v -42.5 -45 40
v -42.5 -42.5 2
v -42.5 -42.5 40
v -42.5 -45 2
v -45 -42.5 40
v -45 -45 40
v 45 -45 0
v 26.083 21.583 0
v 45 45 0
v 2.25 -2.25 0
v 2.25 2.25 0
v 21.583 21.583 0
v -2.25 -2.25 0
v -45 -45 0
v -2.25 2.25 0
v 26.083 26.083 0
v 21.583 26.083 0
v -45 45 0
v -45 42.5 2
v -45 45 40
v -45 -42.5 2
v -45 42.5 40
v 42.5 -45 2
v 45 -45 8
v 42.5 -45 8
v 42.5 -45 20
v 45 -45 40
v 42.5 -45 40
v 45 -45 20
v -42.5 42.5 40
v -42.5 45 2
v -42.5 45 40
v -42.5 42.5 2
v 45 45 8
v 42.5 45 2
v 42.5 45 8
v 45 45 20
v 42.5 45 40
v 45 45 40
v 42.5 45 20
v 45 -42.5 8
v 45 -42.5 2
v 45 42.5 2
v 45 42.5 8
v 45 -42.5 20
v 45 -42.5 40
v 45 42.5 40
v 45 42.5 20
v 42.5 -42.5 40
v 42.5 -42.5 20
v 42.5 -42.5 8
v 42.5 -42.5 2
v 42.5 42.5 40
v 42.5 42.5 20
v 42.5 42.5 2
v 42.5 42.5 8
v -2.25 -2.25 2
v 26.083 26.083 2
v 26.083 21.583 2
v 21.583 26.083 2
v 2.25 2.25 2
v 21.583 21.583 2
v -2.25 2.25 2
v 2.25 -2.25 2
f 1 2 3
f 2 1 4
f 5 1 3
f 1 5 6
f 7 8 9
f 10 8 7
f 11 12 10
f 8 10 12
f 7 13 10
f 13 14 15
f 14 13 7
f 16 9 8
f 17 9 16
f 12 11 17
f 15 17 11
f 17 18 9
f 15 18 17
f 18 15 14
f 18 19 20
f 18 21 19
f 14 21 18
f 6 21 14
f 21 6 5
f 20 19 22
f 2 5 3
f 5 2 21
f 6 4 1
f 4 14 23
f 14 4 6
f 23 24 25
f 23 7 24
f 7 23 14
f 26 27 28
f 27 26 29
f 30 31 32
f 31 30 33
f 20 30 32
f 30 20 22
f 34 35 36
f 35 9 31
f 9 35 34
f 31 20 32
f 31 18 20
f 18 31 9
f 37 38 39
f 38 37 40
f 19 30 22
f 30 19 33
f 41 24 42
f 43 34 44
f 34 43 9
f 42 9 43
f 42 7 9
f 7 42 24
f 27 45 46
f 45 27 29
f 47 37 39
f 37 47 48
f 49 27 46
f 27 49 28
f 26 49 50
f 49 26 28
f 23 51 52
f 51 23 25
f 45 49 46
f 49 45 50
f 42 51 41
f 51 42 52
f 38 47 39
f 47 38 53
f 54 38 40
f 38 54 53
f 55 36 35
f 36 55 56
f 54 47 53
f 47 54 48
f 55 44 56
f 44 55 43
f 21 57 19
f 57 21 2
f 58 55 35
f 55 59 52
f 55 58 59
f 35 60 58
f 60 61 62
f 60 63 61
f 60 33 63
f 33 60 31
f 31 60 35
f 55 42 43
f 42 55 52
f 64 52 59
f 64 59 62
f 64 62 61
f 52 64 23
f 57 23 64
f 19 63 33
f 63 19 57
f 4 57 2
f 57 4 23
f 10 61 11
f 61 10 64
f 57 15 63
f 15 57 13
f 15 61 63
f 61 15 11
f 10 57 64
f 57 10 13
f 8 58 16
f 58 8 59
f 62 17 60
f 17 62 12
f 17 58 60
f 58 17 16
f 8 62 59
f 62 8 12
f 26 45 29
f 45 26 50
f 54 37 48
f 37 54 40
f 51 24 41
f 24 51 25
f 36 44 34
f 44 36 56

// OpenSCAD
// Magnetic stirrer housing (print orientation: upside down)
// Units: mm

// ---- Top plate ----
plate_t      = 2;     // plate thickness (z = 0 to 2)
plate_x      = 90;    // plate outer size in X
plate_y      = 90;    // plate outer size in Y

// ---- Walls ----
wall_t       = 2.5;   // wall thickness
wall_top_z   = 40;    // open top of box (walls rise from plate to this)

// ---- Screw holes ----
hole_d       = 4.5;   // M4 screw hole diameter
hole_n       = 4;     // number of holes
hole_pitch   = 71.5;  // square pattern side length

// ---- Cable notch ----
notch_w      = 12;    // notch width along wall
notch_bottom = 8;     // notch depth from open edge (z = 32 to 40)

// ---- Misc ----
eps          = 0.5;   // cutter overshoot past faces
$fn          = 64;    // curve resolution

difference() {
    // Solid body: top plate + four walls, open top
    union() {
        translate([-plate_x/2, -plate_y/2, 0])
            cube([plate_x, plate_y, plate_t]);
        for (sx = [-1, 1], sy = [-1, 1])
            translate([sx > 0 ? plate_x/2 - wall_t : -plate_x/2,
                       sy > 0 ? plate_y/2 - wall_t : -plate_y/2,
                       0])
                cube([wall_t, wall_t, wall_top_z]);
    }

    // Screw holes through top plate
    for (i = [0 : hole_n - 1]) {
        a = hole_pitch * i / (hole_n - 1);
        translate([a - hole_d/2, a - hole_d/2, -eps])
            cube([hole_d, hole_d, plate_t + 2*eps]);
    }

    // Cable notch in one wall (x = 39.0, z = 32 to 40)
    translate([39.0 - notch_w/2, -plate_y/2 - eps, notch_bottom])
        cube([notch_w, plate_y + 2*eps, notch_w]);
}
